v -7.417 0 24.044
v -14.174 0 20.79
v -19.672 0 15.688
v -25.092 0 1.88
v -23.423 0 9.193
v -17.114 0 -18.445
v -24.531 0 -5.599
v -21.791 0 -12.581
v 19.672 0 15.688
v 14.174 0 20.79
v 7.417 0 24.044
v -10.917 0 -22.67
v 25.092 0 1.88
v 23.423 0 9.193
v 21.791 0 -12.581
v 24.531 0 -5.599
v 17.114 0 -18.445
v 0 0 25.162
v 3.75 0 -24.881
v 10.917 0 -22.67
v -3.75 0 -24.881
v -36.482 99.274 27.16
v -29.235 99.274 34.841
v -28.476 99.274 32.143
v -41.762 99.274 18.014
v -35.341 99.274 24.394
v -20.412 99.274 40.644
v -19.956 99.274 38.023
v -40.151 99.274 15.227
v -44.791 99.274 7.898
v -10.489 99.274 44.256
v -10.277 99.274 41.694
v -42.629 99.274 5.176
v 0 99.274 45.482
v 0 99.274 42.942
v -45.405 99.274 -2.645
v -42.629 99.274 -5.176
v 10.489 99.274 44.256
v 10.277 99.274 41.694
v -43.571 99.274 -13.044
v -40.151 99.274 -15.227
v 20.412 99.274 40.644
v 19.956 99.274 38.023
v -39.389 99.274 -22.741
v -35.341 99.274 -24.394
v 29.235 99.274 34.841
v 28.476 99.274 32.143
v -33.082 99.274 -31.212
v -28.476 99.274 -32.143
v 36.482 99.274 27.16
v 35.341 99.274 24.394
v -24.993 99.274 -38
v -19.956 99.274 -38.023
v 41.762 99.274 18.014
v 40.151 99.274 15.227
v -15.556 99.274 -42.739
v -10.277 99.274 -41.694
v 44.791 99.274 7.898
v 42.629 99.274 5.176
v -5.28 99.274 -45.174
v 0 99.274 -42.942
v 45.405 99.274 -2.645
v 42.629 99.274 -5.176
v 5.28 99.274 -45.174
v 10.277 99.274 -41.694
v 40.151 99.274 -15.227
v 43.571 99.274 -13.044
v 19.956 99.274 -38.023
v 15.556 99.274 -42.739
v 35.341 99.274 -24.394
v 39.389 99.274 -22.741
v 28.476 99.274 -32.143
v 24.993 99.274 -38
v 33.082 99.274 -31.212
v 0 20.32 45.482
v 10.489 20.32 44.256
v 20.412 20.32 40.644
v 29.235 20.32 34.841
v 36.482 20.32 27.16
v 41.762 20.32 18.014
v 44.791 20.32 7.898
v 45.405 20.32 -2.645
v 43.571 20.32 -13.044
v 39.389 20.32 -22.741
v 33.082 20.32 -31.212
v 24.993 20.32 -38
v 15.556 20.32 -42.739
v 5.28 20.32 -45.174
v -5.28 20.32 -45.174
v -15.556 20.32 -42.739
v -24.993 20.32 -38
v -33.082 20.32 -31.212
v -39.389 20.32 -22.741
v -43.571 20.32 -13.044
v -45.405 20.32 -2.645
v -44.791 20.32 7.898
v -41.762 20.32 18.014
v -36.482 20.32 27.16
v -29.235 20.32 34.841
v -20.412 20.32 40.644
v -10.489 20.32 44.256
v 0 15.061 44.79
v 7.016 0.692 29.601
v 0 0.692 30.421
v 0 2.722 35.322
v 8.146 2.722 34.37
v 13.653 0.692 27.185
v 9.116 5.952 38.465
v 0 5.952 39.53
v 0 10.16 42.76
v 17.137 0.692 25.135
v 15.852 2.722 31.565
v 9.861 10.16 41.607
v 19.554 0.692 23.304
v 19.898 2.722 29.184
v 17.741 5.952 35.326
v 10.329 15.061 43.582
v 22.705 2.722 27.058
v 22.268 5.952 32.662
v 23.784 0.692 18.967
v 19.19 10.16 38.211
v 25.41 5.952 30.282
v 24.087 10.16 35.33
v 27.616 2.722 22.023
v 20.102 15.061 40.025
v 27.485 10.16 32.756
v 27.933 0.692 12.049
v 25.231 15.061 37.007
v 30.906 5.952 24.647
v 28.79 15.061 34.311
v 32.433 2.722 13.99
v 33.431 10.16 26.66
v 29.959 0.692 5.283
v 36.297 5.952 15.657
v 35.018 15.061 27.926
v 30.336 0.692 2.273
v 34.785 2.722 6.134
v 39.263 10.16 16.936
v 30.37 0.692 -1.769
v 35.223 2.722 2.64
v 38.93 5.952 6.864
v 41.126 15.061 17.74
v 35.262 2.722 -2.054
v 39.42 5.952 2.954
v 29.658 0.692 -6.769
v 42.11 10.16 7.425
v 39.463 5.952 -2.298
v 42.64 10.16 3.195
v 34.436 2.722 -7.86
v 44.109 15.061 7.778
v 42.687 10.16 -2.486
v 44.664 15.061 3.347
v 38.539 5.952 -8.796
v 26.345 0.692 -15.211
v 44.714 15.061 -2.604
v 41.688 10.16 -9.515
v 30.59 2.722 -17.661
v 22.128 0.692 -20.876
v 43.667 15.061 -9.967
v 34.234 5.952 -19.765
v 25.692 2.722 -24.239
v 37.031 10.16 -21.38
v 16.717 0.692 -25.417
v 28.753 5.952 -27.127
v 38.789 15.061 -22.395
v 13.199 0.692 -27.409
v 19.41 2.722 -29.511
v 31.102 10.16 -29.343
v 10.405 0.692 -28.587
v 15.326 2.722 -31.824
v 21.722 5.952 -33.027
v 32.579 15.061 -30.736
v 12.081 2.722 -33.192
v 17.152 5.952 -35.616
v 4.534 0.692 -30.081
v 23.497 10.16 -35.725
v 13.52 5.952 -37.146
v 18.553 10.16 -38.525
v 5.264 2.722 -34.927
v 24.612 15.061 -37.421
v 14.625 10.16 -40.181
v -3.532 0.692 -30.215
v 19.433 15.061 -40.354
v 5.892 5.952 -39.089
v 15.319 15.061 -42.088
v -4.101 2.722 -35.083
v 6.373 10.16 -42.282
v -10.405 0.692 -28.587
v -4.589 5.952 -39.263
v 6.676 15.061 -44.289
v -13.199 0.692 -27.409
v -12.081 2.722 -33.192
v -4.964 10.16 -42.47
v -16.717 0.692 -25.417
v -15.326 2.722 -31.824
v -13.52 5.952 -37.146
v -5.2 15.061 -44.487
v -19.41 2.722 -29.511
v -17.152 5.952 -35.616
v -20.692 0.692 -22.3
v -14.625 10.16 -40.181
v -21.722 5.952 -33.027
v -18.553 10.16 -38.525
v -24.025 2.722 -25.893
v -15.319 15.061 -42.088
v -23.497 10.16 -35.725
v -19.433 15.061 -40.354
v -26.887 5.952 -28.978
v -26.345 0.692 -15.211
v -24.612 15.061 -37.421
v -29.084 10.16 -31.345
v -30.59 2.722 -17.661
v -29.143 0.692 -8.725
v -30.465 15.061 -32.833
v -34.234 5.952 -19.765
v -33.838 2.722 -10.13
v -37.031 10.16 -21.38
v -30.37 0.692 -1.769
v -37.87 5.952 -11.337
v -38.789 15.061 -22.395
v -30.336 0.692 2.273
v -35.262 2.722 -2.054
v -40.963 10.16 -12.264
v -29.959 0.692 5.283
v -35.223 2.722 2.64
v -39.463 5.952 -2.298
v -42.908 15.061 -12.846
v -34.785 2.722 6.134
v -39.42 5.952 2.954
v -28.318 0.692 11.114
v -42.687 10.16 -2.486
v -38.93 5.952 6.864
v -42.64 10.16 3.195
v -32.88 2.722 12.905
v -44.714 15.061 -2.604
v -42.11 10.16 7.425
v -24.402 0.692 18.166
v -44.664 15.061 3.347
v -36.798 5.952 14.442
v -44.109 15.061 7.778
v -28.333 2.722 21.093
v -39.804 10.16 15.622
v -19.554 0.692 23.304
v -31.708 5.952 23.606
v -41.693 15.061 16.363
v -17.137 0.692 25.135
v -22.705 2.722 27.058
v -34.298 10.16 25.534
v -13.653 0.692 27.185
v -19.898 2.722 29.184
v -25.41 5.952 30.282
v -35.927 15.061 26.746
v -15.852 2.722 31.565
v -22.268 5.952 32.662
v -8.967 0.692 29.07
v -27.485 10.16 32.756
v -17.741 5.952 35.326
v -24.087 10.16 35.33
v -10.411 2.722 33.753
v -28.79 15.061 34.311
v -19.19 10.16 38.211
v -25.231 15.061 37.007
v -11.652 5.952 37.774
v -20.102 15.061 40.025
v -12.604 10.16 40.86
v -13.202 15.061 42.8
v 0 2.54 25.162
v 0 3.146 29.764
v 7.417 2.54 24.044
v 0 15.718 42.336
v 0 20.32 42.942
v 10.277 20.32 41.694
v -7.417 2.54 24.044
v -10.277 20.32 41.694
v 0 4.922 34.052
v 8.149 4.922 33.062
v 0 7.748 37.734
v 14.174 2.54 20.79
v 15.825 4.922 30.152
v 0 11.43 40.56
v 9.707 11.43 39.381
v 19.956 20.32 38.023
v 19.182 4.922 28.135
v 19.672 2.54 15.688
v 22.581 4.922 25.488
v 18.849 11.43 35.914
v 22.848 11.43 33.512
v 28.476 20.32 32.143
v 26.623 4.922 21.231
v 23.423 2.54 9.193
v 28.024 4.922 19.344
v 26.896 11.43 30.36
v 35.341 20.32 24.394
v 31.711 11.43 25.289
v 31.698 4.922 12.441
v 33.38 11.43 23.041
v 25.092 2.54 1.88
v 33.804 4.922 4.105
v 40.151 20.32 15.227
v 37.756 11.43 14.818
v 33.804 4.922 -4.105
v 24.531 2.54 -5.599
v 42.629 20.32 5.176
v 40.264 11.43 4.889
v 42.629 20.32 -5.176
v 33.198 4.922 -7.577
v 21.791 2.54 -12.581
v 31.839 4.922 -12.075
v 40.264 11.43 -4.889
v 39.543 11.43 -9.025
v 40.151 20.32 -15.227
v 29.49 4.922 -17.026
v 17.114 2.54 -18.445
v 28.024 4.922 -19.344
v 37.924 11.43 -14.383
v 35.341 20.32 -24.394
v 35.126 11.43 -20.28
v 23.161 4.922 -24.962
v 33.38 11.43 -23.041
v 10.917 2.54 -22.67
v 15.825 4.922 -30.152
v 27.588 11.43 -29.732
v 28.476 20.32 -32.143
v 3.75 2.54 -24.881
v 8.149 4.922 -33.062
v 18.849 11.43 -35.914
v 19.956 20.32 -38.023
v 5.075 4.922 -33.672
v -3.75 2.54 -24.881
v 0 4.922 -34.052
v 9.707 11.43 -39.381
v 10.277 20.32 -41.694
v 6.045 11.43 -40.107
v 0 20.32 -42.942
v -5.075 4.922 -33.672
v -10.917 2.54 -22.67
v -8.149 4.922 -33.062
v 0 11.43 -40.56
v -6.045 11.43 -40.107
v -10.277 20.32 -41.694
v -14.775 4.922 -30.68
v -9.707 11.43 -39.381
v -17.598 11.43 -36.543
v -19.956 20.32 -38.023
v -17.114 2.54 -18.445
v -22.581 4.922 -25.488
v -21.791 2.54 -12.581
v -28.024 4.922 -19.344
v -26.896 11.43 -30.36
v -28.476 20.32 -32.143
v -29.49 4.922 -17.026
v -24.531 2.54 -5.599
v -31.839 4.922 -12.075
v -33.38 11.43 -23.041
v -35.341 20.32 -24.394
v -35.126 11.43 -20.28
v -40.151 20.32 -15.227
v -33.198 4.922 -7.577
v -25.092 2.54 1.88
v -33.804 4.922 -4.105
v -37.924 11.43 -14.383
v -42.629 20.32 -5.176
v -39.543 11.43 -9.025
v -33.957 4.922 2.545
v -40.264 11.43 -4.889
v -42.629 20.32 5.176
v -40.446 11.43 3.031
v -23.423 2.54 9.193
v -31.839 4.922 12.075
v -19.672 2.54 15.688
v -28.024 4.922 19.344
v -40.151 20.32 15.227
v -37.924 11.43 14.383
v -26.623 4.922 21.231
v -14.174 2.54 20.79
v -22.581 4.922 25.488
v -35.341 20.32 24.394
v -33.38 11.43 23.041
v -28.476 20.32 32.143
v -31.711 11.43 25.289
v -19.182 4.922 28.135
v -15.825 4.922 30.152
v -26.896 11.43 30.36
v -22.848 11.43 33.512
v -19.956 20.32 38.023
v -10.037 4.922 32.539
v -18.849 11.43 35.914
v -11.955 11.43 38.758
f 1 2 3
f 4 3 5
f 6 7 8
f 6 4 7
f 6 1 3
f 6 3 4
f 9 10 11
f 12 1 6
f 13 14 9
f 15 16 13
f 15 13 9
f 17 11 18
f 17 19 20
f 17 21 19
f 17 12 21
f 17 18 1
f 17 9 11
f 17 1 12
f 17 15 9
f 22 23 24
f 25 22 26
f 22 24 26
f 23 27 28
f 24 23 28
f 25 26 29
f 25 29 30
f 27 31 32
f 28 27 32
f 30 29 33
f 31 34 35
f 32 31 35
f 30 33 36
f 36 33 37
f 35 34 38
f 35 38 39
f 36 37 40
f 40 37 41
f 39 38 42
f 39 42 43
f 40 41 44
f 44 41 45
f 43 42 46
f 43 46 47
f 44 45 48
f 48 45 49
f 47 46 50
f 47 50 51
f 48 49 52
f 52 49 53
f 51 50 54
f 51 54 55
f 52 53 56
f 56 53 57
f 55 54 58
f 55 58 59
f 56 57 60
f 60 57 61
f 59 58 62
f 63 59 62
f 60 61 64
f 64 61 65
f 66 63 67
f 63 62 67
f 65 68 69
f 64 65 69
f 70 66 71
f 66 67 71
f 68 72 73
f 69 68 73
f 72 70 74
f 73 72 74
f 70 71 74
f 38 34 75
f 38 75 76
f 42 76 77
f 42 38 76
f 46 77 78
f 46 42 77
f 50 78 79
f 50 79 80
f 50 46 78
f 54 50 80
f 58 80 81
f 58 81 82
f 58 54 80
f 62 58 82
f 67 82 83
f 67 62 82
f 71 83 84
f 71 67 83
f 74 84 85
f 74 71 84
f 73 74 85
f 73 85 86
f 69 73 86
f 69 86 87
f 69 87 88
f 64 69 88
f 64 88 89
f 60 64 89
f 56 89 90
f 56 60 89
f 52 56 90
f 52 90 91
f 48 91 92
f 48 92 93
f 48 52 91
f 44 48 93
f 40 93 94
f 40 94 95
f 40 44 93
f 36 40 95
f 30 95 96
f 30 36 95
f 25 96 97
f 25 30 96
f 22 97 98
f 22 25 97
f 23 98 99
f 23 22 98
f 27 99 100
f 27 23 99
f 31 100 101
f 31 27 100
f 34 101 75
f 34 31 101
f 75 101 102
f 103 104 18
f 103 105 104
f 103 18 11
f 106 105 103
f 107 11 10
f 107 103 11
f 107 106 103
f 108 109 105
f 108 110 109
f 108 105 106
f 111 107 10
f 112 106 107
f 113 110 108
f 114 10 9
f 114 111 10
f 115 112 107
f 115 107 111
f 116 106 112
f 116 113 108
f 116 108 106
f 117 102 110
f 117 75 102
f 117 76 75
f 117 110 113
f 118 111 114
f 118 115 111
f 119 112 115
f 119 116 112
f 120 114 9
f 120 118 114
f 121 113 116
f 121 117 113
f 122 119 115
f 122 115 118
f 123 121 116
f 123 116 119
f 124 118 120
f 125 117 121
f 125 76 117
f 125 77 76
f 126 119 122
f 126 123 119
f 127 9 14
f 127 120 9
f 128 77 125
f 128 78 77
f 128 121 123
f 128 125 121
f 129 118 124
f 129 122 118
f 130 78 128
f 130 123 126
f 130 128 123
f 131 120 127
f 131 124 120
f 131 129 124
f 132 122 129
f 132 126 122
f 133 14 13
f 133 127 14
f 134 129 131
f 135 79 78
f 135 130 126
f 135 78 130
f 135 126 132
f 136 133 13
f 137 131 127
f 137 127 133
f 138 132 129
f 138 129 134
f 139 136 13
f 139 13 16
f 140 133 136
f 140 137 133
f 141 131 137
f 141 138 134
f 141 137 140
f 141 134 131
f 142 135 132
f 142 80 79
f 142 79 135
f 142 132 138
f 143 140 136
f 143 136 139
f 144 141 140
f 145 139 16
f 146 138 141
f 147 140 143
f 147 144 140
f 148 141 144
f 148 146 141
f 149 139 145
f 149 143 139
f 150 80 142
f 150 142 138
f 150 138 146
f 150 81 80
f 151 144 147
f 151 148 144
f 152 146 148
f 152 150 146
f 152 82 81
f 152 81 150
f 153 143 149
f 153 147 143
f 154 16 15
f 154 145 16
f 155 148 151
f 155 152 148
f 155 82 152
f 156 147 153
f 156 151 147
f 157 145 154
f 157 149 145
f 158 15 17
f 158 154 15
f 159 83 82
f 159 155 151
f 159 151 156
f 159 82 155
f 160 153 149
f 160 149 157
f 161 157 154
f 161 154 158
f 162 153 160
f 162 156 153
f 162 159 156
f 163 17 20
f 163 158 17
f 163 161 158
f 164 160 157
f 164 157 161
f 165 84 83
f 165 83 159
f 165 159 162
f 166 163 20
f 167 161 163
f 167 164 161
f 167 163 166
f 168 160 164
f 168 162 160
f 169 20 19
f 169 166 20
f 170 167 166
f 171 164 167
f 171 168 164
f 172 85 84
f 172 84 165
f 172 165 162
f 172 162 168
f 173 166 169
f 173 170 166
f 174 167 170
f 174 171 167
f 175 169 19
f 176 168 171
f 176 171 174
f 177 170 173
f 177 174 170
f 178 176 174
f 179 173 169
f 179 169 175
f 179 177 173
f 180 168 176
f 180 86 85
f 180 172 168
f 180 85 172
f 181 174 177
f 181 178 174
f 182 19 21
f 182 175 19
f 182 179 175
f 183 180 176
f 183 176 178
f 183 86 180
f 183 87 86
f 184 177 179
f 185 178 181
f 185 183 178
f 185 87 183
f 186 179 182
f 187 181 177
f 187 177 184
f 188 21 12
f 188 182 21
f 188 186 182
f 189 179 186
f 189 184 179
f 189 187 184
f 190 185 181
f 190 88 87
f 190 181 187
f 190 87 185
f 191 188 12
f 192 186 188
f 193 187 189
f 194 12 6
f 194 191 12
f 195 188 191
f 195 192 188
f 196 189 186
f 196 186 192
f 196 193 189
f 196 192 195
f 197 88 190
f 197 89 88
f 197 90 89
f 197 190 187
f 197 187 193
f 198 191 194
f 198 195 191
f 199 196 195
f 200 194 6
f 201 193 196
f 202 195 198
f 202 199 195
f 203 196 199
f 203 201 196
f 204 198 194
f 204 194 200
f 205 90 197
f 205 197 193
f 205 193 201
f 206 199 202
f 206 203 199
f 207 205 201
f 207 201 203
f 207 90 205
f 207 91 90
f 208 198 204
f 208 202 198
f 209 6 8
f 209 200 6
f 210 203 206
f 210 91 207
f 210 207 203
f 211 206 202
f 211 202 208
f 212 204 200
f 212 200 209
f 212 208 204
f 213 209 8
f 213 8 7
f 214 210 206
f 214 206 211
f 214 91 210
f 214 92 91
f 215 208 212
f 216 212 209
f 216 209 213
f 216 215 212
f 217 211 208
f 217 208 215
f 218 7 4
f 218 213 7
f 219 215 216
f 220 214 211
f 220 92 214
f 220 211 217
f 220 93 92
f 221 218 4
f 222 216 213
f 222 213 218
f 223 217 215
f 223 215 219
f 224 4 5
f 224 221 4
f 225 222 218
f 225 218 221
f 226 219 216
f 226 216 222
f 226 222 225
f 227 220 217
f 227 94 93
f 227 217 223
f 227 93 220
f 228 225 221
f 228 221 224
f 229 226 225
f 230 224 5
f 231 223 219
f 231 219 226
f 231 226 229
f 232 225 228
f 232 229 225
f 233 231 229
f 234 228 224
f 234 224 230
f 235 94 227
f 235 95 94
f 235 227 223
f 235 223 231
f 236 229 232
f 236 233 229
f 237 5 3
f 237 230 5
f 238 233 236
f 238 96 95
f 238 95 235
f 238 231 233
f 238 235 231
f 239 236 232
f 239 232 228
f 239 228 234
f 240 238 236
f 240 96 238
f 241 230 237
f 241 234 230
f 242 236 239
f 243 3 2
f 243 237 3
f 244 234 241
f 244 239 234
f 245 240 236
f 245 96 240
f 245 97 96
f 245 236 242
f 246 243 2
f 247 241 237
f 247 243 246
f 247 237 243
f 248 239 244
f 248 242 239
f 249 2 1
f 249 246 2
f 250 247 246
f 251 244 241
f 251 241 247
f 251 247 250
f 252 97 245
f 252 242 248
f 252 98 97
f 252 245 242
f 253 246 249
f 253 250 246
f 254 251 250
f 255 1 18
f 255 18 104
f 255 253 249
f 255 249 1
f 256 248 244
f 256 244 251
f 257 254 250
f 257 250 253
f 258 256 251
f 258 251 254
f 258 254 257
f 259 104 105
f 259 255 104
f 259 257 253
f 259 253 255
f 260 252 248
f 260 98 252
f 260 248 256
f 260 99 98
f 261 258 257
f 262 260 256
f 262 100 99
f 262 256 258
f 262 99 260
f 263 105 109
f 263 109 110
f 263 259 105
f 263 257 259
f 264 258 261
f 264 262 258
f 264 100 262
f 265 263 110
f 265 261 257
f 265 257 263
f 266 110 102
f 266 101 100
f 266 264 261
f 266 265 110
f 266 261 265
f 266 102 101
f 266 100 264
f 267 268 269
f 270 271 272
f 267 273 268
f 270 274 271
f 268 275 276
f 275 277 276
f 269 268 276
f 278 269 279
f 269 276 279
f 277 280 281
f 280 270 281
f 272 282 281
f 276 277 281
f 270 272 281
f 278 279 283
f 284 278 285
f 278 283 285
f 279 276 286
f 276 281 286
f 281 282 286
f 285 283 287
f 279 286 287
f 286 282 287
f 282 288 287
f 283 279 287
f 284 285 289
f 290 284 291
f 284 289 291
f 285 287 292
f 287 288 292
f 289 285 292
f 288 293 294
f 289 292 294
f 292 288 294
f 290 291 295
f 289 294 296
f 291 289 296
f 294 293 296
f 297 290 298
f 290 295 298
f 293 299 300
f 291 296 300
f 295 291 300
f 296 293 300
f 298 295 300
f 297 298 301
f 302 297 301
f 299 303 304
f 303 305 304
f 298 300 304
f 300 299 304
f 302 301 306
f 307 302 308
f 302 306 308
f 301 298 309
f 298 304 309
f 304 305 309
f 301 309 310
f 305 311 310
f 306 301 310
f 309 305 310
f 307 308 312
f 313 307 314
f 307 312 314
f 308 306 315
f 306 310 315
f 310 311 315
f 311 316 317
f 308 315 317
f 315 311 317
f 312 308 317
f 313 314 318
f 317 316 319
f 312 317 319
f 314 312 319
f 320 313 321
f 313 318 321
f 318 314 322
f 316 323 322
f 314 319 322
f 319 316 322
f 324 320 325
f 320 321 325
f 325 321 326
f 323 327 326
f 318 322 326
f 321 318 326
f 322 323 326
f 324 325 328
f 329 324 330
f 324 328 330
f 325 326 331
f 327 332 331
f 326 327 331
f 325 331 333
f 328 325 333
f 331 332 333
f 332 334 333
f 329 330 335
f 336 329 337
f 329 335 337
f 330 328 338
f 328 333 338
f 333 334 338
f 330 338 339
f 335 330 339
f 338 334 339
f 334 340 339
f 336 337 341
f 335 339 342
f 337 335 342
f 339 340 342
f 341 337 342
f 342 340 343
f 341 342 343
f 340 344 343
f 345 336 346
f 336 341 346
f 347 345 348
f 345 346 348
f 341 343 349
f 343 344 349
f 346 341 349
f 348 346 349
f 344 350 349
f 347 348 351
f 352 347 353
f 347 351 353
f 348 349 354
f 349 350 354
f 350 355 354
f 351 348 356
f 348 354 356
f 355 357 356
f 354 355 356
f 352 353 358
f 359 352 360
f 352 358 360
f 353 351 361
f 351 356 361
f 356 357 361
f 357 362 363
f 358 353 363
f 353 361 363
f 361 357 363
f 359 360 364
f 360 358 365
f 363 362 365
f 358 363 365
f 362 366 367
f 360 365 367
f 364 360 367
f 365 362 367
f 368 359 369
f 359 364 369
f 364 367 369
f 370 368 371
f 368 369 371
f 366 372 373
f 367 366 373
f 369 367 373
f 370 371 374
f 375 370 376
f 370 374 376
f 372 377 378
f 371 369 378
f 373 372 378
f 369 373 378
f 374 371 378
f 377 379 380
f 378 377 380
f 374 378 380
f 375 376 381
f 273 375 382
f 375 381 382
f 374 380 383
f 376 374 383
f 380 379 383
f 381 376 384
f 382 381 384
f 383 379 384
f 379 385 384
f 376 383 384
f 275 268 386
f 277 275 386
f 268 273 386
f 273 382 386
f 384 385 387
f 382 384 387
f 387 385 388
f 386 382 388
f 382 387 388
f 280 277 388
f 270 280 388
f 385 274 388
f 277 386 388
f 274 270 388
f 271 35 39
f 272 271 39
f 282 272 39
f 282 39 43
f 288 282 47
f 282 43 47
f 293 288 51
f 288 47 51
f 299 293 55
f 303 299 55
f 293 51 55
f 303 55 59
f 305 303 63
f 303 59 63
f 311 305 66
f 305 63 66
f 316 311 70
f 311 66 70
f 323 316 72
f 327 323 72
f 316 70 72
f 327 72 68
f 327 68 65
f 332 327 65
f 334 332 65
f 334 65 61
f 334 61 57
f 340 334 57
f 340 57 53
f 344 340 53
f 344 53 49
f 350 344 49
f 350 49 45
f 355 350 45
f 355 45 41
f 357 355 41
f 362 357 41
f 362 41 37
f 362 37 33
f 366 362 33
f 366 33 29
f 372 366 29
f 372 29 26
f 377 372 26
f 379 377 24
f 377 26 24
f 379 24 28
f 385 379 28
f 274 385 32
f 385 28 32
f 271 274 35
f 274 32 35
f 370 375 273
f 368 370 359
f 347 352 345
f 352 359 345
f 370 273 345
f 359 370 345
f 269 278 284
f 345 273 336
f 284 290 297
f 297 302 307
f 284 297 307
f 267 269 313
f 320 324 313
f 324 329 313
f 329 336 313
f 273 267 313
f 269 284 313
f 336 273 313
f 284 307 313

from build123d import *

# Parameters (mm, degrees)
F0_W = 99.274278
F0_H = 45.48195
F2_R = 20.32
F3_T = -2.54


with BuildPart() as f1:
    # F0 (on Right) → F1 (revolve)
    with BuildSketch(Plane.YZ):
        with Locations((49.637139, 22.740975)):
            Rectangle(F0_W, F0_H)
    revolve(axis=Axis((0, 49.637139, 0), (0, 1, 0)))

    # F2
    f2_edges = [f1.edges().sort_by_distance(p)[0] for p in [
        (0, 0, -45.48195),
    ]]
    fillet(f2_edges, radius=F2_R)

    # F3
    f3_openings = [f1.faces().sort_by_distance(p)[0] for p in [
        (0, 99.274278, 0),
    ]]
    offset(amount=F3_T, openings=f3_openings)


solid = f1.part
